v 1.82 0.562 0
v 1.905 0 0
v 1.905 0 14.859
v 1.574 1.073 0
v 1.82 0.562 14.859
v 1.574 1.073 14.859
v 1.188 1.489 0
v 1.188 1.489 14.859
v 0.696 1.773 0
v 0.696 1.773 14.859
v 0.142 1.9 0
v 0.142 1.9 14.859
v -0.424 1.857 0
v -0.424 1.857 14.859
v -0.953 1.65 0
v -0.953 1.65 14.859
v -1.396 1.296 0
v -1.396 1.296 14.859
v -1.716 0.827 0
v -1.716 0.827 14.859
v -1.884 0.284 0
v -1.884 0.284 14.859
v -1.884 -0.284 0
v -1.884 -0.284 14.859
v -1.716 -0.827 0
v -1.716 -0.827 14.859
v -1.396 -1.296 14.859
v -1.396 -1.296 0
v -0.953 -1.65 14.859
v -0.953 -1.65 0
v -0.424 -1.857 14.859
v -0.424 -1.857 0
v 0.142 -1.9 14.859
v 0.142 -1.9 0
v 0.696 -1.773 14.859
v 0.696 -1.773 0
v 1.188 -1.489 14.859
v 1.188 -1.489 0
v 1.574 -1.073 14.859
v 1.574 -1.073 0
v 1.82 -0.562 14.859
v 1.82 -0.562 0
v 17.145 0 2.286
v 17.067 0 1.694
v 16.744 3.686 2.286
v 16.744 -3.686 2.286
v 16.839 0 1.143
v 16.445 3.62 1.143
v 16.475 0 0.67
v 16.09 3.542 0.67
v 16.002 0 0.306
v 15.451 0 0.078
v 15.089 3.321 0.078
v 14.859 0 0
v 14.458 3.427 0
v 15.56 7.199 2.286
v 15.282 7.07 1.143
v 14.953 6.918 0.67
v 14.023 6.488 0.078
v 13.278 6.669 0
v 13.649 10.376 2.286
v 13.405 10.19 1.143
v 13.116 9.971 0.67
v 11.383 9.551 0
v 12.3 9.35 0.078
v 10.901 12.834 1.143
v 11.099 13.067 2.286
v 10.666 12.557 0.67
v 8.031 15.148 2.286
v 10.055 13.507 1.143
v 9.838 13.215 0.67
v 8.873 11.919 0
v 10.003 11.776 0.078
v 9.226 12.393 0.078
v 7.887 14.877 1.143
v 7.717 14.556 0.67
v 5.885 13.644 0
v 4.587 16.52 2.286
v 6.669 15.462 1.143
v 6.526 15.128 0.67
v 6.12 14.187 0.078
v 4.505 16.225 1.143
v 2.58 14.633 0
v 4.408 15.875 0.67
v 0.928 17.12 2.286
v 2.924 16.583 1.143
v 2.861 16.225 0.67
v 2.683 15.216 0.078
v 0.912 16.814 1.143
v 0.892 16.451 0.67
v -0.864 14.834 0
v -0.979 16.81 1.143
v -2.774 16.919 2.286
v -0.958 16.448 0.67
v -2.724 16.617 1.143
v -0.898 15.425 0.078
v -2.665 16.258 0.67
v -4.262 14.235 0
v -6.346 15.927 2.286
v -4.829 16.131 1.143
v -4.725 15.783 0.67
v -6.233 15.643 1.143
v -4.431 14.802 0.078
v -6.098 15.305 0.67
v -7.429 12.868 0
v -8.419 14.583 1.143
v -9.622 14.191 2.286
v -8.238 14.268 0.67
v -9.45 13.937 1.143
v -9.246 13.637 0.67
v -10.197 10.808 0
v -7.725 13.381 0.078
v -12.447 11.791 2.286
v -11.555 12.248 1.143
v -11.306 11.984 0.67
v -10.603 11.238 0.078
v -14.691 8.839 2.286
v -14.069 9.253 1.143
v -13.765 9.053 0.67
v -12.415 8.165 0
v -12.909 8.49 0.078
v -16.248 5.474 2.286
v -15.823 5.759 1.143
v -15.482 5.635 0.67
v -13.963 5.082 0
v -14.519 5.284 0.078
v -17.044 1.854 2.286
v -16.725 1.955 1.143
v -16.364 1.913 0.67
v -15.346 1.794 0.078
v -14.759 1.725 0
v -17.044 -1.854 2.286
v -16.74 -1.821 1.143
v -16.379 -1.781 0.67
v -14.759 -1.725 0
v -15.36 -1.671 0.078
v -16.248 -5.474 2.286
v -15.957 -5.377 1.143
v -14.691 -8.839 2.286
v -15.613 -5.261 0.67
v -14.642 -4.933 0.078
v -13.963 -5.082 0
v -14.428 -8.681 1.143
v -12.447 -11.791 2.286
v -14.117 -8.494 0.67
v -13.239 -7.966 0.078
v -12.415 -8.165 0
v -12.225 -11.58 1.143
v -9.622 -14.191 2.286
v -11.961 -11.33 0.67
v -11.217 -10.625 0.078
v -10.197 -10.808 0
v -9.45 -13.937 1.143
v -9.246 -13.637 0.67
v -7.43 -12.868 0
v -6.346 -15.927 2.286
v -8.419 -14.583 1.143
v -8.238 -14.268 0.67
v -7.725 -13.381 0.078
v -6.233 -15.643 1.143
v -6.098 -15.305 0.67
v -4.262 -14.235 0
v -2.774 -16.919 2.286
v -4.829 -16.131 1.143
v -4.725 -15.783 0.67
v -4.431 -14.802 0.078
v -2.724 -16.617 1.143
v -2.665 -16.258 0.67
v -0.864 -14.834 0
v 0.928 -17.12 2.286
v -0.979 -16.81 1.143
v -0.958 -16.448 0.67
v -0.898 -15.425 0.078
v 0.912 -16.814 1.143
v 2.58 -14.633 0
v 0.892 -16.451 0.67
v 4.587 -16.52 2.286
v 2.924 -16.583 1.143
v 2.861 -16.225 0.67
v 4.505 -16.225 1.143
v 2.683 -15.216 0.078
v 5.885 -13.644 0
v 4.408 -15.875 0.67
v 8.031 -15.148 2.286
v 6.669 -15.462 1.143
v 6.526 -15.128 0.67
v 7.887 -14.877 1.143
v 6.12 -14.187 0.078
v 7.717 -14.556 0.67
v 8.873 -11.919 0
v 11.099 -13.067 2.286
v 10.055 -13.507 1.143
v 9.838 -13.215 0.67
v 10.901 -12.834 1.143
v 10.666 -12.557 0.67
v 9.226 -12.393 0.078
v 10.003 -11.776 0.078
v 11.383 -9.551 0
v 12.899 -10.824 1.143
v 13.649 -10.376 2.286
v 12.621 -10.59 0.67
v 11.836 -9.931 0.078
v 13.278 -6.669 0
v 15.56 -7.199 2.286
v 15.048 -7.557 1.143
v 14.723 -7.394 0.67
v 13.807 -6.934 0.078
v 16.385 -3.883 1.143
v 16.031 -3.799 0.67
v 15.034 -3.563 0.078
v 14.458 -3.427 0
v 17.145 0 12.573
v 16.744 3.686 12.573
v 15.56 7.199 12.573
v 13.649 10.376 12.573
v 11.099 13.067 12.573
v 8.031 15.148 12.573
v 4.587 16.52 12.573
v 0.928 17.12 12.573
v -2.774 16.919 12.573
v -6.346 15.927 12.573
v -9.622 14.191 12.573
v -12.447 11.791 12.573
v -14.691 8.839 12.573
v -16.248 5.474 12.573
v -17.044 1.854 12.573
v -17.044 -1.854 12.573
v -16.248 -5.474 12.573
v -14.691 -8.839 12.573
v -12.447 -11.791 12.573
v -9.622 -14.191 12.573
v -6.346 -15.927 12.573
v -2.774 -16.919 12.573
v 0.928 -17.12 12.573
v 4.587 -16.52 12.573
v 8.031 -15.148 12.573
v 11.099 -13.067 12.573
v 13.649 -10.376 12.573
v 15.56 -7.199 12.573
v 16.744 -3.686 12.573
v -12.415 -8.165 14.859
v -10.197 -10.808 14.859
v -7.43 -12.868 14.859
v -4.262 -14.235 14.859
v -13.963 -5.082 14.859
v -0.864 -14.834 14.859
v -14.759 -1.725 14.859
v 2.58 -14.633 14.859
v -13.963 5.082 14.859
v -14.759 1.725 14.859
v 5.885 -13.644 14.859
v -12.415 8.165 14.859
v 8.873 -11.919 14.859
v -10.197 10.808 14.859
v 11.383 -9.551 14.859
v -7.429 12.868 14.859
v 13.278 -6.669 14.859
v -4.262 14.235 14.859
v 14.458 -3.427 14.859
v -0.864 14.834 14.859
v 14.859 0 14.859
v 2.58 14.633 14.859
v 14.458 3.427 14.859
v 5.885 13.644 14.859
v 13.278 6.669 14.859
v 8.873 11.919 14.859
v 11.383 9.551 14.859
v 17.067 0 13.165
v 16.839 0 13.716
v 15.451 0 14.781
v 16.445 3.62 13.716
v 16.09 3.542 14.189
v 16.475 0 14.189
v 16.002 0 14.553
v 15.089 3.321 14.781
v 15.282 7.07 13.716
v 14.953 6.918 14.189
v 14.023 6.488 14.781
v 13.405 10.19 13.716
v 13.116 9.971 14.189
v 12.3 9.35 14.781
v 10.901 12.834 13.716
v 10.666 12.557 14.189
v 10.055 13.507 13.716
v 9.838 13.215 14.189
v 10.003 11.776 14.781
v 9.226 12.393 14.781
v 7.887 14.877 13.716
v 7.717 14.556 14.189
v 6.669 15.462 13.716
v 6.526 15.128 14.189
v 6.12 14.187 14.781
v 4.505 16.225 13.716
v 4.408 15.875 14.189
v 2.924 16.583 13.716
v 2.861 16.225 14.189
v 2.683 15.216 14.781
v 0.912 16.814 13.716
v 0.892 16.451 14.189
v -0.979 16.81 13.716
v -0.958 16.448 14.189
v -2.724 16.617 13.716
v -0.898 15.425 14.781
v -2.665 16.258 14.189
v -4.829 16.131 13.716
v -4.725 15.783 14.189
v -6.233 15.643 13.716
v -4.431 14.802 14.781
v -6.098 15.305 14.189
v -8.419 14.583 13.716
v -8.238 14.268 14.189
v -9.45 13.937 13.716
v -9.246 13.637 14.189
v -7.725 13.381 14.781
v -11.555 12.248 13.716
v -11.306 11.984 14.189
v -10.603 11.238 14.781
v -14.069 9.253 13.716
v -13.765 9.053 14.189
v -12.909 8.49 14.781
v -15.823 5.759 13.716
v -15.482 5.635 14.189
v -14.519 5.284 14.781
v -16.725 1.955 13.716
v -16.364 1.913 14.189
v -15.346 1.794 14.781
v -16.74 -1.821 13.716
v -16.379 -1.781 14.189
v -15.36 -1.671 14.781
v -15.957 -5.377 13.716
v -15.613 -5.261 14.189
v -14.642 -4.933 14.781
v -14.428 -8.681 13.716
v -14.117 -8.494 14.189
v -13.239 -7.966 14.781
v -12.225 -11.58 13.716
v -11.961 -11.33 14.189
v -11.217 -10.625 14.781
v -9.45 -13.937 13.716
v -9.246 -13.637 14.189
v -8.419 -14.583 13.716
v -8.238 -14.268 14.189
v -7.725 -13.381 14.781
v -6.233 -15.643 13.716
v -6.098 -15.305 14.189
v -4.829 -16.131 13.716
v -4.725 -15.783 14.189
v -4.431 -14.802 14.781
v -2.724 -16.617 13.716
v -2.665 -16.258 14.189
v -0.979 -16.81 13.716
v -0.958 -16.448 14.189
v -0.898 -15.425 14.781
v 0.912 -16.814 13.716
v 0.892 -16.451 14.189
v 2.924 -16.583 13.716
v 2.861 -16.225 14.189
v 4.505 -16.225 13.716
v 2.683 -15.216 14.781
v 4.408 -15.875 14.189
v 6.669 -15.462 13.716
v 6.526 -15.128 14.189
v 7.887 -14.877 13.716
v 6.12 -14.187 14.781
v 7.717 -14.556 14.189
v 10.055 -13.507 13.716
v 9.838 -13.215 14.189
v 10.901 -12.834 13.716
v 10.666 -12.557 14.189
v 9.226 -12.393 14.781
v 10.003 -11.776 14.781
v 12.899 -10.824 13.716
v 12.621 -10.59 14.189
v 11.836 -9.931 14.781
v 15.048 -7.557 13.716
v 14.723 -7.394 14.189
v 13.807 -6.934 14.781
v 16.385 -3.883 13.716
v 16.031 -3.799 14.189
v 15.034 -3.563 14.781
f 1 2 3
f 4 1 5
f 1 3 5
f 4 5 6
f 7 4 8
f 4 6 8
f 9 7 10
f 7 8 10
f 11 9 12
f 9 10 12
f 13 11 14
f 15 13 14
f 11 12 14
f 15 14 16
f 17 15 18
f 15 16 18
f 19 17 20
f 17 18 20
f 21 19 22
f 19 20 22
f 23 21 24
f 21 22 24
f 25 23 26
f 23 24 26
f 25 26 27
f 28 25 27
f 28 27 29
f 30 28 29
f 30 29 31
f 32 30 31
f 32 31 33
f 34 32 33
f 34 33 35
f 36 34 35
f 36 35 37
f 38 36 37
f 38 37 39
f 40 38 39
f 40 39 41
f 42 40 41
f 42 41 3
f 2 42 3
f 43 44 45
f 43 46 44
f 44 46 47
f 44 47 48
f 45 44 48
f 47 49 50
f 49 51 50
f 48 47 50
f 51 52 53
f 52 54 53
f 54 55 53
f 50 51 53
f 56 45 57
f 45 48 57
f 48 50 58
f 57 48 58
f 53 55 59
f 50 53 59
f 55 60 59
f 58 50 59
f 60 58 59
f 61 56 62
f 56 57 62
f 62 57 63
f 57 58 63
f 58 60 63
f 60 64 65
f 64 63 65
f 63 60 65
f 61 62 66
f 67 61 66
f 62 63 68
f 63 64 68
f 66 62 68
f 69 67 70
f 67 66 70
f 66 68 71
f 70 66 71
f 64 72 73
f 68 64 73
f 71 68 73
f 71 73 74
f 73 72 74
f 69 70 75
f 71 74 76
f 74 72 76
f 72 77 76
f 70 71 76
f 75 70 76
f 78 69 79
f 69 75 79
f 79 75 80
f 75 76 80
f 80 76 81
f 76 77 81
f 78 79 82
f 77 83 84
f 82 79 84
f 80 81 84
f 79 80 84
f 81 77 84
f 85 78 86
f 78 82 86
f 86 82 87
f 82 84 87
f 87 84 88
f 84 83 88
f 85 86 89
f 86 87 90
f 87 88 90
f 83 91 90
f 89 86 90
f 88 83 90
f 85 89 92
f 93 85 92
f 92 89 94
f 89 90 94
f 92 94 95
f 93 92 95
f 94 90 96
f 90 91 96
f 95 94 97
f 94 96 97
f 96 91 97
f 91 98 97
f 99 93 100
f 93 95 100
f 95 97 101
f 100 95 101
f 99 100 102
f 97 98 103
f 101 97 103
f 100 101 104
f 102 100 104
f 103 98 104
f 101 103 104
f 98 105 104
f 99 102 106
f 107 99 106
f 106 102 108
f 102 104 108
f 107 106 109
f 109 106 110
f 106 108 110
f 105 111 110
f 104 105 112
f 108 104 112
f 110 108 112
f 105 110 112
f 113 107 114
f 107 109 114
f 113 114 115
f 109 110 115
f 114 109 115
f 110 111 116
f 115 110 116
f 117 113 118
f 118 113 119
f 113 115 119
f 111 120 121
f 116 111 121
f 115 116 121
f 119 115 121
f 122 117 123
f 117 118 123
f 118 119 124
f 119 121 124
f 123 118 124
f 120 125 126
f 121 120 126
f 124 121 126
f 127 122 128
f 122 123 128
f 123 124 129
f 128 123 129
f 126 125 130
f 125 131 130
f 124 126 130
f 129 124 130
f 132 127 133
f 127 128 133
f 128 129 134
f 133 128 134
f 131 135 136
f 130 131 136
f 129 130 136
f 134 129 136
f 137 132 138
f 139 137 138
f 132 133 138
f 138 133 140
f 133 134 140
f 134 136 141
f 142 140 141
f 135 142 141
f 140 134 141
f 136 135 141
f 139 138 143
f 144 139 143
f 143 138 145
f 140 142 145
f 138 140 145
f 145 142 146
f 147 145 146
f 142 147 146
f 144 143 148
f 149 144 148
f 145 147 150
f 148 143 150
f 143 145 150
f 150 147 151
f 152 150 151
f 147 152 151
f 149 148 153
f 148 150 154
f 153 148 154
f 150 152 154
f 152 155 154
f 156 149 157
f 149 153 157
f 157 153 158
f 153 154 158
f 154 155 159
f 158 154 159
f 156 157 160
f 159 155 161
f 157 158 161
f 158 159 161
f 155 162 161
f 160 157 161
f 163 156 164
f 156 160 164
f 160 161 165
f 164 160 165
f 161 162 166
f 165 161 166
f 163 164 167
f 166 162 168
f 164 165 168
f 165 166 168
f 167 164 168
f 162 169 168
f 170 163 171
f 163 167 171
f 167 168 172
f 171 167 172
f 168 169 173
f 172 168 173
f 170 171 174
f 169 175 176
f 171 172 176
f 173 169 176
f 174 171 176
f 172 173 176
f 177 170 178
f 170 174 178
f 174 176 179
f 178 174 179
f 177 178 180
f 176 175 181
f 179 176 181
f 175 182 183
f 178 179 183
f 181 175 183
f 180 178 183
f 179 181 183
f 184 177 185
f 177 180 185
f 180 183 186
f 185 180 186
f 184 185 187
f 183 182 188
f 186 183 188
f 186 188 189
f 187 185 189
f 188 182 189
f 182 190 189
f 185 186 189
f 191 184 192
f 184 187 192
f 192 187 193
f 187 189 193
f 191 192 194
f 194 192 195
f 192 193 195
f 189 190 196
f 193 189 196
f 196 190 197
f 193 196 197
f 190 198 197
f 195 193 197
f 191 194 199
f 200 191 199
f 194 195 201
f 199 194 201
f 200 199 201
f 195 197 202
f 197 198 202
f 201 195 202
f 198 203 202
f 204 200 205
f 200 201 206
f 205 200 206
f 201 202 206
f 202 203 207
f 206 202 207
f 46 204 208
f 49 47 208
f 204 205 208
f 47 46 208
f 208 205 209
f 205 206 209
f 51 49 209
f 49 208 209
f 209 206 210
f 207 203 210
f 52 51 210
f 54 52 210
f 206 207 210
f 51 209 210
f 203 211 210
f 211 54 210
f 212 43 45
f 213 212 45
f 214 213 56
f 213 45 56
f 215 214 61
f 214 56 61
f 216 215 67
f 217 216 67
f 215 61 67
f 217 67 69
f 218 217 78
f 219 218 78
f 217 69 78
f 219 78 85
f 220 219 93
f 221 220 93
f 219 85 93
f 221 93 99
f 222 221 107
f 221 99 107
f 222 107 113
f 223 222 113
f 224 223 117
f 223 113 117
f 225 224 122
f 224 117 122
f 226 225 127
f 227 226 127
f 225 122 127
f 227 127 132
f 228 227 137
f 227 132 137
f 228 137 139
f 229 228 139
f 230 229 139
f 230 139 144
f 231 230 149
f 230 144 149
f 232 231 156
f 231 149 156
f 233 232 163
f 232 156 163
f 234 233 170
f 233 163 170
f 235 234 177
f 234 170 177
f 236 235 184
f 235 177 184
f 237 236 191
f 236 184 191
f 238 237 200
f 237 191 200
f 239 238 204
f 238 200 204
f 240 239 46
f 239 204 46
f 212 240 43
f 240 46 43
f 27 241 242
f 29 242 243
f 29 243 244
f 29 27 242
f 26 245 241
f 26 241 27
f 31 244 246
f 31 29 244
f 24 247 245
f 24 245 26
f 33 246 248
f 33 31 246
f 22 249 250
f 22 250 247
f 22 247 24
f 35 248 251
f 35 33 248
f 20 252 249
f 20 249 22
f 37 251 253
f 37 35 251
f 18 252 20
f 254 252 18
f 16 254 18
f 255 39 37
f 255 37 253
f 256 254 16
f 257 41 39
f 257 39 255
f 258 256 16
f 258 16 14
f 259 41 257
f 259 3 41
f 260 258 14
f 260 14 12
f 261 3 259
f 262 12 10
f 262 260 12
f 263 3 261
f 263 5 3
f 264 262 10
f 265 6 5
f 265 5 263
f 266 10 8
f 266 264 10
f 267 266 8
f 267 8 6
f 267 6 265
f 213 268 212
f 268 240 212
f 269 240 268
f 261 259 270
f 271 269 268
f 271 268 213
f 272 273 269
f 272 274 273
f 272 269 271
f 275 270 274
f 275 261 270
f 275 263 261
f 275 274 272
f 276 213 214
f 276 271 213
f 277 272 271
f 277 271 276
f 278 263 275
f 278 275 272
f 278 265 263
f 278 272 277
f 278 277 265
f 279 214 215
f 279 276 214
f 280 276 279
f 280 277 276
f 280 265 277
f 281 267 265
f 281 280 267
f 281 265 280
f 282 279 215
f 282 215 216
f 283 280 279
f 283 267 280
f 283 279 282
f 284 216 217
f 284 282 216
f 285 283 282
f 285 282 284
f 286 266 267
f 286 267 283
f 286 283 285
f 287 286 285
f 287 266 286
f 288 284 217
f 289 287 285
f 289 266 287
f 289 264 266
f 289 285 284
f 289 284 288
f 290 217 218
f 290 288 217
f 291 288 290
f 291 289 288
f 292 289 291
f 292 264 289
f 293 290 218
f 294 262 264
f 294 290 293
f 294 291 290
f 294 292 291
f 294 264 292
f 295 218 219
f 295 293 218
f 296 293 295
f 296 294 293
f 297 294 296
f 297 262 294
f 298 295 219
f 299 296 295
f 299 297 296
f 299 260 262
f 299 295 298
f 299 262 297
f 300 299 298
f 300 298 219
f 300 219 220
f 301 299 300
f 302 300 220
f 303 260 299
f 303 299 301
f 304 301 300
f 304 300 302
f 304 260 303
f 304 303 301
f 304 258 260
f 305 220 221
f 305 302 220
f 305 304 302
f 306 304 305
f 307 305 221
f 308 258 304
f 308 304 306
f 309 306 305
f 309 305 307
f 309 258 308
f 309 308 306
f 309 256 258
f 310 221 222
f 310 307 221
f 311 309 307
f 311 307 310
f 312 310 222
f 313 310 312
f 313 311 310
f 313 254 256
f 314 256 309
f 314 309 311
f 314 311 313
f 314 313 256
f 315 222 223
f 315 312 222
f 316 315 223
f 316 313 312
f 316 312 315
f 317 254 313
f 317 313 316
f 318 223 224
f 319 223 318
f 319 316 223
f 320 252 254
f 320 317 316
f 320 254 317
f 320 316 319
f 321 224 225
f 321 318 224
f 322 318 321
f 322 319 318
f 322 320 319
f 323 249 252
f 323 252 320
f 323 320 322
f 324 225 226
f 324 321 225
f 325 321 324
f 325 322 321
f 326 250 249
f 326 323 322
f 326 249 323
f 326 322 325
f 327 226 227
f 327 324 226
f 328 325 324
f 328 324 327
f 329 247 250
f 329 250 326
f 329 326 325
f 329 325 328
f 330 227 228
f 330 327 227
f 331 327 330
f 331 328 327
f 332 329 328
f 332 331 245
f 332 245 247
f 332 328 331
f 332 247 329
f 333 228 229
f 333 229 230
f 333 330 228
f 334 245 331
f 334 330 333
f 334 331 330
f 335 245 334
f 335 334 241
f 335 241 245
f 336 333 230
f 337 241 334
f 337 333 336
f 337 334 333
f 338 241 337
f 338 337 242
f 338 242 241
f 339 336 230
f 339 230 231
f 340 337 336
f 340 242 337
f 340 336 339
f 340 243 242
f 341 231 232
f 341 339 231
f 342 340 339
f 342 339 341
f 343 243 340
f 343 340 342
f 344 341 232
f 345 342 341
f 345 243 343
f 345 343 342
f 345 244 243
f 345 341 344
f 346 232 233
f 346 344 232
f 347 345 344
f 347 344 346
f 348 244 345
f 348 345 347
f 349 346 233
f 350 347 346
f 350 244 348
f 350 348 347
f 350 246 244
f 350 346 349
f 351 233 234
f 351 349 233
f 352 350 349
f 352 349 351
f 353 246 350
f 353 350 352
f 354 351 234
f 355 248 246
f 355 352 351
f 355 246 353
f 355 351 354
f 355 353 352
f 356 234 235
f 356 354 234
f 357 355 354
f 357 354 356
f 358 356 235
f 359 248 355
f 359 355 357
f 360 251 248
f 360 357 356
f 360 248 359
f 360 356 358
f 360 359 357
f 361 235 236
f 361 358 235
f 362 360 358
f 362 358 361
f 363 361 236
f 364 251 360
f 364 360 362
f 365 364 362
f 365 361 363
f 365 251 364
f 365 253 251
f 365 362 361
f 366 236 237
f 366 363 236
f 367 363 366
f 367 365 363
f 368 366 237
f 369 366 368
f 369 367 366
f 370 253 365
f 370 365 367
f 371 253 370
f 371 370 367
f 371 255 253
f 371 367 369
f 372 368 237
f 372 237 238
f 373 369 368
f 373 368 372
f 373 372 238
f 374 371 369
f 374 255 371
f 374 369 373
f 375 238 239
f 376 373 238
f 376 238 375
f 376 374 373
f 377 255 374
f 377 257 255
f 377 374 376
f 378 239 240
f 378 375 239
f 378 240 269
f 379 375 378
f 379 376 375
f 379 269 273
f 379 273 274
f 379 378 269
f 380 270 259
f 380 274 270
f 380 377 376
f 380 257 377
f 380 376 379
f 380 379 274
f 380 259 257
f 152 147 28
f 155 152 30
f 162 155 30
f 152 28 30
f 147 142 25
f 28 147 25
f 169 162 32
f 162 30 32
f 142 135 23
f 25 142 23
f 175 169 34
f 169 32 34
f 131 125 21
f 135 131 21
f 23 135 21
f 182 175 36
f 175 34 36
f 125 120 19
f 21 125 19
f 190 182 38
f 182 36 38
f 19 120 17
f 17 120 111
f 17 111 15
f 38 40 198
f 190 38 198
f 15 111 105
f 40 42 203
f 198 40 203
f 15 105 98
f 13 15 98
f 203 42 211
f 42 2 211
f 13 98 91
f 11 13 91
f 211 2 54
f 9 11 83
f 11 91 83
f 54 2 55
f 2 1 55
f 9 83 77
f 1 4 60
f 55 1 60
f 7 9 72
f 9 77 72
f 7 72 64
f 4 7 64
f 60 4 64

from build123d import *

# Parameters (mm, degrees)
SKETCH1_R           = 38.1
BOSS_EXTRUDE1_DEPTH = 33.02
FILLET1_R           = 5.08
SCALE1_SCALE        = 0.45
SKETCH3_R           = 1.905
CUT_EXTRUDE1_DEPTH  = 29.437509287


with BuildPart() as part:
    # Sketch1 → Boss-Extrude1 (new body)
    with BuildSketch(Plane.XY):
        Circle(SKETCH1_R)
    extrude(amount=BOSS_EXTRUDE1_DEPTH)

    # Fillet1
    fillet1_edges = [part.edges().sort_by_distance(p)[0] for p in [
        (-38.1, 0, 0),
        (-38.1, 0, 33.02),
    ]]
    fillet(fillet1_edges, radius=FILLET1_R)


with BuildPart() as part_1:
    # Scale1: scaled about (0, 0, 0)
    add(part.part.scale(SCALE1_SCALE))

    # Sketch3 → Cut-Extrude1 (cut, through all)
    with BuildSketch(Plane.XY.offset(14.859)):
        Circle(SKETCH3_R)
    extrude(amount=-CUT_EXTRUDE1_DEPTH, mode=Mode.SUBTRACT)


solid = part_1.part
